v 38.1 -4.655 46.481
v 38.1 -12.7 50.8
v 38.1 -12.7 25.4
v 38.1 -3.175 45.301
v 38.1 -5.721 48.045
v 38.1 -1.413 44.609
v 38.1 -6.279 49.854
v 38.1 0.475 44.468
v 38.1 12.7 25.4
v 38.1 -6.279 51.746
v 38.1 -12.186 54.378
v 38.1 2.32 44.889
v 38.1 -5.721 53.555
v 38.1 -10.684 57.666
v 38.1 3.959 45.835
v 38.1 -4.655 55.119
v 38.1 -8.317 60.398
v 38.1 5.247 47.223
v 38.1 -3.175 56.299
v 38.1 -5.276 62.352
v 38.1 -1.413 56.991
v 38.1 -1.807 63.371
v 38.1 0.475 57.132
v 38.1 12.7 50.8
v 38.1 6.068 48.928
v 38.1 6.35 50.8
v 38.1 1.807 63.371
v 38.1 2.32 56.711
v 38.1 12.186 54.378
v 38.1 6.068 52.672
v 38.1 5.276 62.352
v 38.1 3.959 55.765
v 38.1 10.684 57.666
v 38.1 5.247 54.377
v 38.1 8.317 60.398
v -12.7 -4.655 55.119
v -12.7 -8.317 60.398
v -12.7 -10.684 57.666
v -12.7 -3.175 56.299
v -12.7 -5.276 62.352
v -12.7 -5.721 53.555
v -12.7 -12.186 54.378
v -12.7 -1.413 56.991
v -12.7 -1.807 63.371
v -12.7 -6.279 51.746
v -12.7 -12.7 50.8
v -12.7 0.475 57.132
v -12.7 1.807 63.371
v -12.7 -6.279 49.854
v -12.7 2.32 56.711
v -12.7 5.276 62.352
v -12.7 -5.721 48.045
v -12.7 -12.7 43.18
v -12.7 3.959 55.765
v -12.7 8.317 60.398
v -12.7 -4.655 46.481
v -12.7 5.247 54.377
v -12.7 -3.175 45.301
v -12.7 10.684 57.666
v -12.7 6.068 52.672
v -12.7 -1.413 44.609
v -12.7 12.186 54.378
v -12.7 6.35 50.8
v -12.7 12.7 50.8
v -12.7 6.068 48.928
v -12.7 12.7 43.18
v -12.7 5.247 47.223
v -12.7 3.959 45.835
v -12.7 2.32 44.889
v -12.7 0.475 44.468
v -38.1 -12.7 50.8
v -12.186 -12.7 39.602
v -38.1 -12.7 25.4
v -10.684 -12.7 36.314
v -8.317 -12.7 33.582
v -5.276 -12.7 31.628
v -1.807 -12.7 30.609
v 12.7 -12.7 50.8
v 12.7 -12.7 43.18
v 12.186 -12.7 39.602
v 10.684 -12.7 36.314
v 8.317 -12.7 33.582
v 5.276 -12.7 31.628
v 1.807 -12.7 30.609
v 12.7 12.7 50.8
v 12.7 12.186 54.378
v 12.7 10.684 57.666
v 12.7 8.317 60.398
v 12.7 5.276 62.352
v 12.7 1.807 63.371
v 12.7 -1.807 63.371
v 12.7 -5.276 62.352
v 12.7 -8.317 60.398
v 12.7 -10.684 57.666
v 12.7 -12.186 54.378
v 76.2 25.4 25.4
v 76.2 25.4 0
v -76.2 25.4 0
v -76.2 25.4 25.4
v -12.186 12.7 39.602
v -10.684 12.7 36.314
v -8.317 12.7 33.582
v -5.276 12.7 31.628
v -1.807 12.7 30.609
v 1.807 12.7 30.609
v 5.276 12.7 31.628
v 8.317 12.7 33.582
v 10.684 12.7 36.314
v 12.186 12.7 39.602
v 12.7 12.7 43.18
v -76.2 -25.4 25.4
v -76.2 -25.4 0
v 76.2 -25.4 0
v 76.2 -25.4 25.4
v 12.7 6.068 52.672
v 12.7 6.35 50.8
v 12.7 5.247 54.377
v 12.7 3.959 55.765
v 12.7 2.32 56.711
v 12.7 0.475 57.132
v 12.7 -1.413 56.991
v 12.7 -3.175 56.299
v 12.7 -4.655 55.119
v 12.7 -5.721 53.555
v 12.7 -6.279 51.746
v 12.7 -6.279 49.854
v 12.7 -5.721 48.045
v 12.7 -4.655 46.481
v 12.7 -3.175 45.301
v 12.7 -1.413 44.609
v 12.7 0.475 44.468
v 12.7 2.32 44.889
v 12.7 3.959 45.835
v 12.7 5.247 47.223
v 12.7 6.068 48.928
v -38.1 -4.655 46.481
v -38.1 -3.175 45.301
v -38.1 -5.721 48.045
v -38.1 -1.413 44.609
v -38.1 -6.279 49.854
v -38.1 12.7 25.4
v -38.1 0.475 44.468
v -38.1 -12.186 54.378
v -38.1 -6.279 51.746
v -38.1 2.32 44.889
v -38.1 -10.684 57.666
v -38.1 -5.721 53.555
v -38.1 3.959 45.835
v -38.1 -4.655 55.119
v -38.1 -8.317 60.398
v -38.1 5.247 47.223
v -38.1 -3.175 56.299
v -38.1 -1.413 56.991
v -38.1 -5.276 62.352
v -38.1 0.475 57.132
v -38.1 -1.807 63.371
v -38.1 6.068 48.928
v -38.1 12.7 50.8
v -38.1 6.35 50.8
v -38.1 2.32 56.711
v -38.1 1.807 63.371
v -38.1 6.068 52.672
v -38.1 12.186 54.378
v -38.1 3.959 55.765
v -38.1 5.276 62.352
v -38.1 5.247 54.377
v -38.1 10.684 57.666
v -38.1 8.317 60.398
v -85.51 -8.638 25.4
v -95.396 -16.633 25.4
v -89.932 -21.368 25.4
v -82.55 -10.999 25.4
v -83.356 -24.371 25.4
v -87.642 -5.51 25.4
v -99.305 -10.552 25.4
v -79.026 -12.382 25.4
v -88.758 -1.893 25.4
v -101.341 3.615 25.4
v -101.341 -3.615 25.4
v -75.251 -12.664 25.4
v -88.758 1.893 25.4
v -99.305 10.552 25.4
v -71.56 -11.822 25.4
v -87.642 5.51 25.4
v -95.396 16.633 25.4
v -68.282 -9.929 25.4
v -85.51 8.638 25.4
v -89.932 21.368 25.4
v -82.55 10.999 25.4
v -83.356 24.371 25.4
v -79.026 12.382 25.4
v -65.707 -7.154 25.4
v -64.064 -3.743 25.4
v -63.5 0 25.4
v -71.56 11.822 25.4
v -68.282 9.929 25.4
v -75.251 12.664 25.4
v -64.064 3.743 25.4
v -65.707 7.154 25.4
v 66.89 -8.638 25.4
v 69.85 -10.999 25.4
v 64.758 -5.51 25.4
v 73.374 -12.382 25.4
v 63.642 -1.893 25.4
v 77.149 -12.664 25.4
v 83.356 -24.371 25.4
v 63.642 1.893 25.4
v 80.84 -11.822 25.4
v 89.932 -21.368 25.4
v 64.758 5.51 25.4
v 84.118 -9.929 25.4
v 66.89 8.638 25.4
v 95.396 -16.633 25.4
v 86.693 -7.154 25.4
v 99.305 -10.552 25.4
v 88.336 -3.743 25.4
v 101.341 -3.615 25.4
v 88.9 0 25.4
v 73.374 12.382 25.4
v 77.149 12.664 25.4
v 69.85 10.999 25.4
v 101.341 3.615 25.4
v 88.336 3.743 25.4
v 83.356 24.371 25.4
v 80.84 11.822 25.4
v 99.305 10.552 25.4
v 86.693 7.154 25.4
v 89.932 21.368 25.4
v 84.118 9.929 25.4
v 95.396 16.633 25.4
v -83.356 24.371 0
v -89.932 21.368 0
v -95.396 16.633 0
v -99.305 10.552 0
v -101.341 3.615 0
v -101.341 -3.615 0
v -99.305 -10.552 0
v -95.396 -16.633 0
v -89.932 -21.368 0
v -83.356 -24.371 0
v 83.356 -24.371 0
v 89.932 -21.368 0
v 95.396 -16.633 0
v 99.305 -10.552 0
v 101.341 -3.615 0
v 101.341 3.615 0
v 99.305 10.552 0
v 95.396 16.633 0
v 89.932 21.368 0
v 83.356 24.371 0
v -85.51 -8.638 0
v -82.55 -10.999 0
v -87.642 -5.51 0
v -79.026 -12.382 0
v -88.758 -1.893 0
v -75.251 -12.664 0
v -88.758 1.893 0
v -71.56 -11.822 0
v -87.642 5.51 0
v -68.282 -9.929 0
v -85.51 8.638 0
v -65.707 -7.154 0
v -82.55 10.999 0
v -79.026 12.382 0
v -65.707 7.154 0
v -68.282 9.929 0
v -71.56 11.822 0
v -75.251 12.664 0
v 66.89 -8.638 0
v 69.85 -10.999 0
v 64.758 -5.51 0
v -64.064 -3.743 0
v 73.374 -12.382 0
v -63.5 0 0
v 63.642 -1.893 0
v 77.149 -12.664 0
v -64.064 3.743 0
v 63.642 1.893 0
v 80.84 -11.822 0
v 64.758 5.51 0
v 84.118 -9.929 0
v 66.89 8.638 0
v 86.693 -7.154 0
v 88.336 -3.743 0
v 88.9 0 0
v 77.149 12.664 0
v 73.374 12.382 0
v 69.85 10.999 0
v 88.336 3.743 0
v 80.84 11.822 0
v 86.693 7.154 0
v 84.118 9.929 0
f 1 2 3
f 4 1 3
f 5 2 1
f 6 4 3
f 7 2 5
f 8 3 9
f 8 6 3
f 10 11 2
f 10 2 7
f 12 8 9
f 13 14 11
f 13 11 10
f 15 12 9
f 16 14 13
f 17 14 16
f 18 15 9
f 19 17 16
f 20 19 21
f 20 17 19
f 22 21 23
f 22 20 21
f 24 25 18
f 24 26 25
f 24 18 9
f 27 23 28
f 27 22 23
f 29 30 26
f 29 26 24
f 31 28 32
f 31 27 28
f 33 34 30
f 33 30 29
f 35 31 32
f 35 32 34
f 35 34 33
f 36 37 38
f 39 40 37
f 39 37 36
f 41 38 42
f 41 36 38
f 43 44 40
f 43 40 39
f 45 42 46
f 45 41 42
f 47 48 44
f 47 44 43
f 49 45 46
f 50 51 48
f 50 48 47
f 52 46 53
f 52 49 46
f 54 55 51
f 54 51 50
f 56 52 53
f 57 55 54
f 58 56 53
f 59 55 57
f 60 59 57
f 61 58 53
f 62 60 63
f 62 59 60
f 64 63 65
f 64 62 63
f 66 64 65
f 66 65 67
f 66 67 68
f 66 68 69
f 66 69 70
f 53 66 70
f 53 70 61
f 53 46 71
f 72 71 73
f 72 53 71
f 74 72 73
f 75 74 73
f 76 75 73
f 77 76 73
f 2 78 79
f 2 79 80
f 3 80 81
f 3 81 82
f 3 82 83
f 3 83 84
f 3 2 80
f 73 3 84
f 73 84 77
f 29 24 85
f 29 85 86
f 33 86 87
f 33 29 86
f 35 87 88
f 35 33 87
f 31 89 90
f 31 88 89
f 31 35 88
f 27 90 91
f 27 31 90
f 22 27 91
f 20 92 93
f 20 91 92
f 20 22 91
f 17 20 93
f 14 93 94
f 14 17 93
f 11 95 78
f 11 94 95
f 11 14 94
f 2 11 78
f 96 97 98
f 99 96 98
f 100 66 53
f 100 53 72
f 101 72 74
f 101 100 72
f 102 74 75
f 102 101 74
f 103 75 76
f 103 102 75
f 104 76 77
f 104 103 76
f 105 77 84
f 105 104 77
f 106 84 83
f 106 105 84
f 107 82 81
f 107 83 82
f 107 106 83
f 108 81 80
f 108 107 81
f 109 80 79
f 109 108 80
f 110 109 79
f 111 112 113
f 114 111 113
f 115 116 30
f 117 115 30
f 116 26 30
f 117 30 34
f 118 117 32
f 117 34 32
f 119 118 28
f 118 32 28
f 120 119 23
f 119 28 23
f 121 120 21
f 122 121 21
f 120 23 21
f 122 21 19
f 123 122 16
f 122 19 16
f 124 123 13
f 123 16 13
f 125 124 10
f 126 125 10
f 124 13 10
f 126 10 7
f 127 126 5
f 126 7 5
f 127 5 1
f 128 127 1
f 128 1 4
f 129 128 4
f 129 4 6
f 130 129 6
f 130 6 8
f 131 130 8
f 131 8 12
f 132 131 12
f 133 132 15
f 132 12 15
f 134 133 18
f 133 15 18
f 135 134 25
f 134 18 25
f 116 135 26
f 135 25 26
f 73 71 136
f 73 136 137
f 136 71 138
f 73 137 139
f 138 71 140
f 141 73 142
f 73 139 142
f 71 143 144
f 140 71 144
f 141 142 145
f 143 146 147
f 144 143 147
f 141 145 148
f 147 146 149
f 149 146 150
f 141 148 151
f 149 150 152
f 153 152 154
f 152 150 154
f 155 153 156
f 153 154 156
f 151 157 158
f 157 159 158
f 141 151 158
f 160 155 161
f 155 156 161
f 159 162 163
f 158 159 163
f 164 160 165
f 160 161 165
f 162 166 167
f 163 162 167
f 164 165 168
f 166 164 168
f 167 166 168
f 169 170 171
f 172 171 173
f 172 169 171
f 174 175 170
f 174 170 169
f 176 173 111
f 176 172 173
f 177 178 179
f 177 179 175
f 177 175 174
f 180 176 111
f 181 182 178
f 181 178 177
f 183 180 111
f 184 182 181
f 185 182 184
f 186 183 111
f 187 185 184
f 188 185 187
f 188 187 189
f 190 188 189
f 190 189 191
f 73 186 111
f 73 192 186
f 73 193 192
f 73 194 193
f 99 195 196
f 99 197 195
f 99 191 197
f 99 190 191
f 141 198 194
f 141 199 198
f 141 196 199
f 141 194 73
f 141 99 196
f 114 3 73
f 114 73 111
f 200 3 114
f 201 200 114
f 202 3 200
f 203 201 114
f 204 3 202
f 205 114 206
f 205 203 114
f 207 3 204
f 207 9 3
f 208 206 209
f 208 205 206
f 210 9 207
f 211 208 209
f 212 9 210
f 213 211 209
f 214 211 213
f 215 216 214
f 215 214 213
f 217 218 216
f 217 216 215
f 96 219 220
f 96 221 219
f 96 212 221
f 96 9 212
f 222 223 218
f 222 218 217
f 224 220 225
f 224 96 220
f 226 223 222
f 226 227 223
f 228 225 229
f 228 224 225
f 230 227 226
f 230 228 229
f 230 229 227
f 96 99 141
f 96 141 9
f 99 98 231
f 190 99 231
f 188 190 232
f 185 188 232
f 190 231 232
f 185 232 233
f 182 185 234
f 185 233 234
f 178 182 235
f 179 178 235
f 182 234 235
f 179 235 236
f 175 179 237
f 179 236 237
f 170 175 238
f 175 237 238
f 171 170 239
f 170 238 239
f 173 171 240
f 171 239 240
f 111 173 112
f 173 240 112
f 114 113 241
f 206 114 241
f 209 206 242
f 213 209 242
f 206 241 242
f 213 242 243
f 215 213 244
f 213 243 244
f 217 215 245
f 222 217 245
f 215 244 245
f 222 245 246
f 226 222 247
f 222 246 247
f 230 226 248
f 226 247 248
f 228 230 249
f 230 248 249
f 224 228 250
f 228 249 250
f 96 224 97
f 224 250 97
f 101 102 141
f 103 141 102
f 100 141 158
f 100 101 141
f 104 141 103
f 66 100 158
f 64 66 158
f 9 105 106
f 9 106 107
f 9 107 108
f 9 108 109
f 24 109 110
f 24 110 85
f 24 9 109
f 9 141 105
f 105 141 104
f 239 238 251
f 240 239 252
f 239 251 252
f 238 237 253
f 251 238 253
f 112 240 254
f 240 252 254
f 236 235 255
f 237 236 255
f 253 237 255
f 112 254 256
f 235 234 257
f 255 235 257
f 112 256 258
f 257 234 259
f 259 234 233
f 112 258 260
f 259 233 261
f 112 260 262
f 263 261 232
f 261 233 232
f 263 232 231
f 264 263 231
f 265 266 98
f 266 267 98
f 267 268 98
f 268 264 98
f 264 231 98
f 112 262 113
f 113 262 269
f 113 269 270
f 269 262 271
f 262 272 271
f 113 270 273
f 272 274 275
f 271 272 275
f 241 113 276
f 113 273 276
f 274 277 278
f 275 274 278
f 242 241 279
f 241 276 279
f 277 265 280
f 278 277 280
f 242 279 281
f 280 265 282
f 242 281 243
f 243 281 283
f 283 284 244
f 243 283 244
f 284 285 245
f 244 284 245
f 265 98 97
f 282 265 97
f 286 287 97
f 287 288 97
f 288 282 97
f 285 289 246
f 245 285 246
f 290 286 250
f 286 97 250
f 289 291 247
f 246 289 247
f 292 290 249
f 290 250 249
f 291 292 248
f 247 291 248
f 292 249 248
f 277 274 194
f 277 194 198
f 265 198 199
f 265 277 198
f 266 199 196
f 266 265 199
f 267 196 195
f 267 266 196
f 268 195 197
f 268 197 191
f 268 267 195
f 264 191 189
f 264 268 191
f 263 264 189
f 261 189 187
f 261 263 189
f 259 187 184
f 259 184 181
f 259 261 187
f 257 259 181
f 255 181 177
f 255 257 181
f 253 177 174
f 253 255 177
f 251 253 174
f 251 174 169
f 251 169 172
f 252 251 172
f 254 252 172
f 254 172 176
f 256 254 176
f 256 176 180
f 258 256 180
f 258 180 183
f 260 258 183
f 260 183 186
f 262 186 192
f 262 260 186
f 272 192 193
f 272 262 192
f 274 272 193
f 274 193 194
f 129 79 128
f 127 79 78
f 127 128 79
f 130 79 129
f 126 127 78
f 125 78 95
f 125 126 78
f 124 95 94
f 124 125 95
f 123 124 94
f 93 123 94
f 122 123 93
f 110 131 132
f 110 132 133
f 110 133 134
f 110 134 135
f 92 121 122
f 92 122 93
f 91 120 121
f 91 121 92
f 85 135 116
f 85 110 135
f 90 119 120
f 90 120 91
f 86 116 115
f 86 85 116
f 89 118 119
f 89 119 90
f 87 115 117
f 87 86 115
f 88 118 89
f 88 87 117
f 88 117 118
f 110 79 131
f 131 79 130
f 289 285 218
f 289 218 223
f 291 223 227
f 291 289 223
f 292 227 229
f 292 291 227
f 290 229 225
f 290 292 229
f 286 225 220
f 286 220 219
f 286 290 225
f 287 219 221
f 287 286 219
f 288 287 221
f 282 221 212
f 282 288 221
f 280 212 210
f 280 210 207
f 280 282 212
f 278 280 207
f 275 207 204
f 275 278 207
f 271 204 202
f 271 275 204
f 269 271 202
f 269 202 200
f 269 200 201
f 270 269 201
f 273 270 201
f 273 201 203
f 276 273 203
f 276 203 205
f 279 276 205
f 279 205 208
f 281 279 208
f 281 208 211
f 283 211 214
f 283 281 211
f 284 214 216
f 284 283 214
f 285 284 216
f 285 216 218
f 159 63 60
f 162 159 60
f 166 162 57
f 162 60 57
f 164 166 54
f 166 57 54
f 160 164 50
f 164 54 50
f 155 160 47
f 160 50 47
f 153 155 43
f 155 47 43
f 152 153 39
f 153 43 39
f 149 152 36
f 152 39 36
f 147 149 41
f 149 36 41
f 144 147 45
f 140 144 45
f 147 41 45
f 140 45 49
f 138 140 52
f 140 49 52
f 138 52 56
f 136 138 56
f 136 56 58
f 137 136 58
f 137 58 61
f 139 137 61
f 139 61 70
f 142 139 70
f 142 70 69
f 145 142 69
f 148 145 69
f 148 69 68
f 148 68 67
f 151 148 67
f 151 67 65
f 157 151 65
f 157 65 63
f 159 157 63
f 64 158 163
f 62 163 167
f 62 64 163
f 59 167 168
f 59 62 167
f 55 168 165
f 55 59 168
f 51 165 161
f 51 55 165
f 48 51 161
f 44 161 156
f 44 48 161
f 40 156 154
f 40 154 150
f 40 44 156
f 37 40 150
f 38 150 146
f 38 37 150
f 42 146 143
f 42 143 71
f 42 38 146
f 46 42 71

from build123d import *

# Parameters (mm, degrees)
F0_R          = 12.7
F1_DEPTH      = 25.4
F2_R          = 6.35
F3_DEPTH      = 38.1
F3_DEPTH_BACK = 38.1
F5_DEPTH      = 25.4
F5_DEPTH_BACK = 25.4


with BuildPart() as f1:
    # F0 (on Top) → F1 (new body)
    with BuildSketch(Plane.XY):
        with BuildLine():
            Line((76.2, 25.4), (-76.2, 25.4))
            ThreePointArc((-76.2, 25.4), (-101.6, 0), (-76.2, -25.4))
            Line((-76.2, -25.4), (76.2, -25.4))
            ThreePointArc((76.2, -25.4), (101.6, 0), (76.2, 25.4))
        make_face()
        with Locations((-76.2, 0)):
            Circle(F0_R, mode=Mode.SUBTRACT)
        with Locations((76.2, 0)):
            Circle(F0_R, mode=Mode.SUBTRACT)
    extrude(amount=F1_DEPTH)

    # F2 (on Right) → F3 (join, two sides)
    with BuildSketch(Plane.YZ) as f3_sk:
        with BuildLine():
            Line((-12.7, 50.8), (-12.7, 25.4))
            Line((-12.7, 25.4), (12.7, 25.4))
            Line((12.7, 25.4), (12.7, 50.8))
            ThreePointArc((12.7, 50.8), (0, 63.5), (-12.7, 50.8))
        make_face()
        with Locations((0, 50.8)):
            Circle(F2_R, mode=Mode.SUBTRACT)
    extrude(amount=F3_DEPTH)
    extrude(f3_sk.sketch, amount=-F3_DEPTH_BACK)

    # F4 (on Front) → F5 (cut, two sides)
    with BuildSketch(Plane.XZ) as f5_sk:
        with BuildLine():
            Line((12.7, 43.18), (12.7, 63.5))
            Line((12.7, 63.5), (-12.7, 63.5))
            Line((-12.7, 63.5), (-12.7, 43.18))
            ThreePointArc((-12.7, 43.18), (0, 30.48), (12.7, 43.18))
        make_face()
    extrude(amount=-F5_DEPTH, mode=Mode.SUBTRACT)
    extrude(f5_sk.sketch, amount=F5_DEPTH_BACK, mode=Mode.SUBTRACT)


solid = f1.part
